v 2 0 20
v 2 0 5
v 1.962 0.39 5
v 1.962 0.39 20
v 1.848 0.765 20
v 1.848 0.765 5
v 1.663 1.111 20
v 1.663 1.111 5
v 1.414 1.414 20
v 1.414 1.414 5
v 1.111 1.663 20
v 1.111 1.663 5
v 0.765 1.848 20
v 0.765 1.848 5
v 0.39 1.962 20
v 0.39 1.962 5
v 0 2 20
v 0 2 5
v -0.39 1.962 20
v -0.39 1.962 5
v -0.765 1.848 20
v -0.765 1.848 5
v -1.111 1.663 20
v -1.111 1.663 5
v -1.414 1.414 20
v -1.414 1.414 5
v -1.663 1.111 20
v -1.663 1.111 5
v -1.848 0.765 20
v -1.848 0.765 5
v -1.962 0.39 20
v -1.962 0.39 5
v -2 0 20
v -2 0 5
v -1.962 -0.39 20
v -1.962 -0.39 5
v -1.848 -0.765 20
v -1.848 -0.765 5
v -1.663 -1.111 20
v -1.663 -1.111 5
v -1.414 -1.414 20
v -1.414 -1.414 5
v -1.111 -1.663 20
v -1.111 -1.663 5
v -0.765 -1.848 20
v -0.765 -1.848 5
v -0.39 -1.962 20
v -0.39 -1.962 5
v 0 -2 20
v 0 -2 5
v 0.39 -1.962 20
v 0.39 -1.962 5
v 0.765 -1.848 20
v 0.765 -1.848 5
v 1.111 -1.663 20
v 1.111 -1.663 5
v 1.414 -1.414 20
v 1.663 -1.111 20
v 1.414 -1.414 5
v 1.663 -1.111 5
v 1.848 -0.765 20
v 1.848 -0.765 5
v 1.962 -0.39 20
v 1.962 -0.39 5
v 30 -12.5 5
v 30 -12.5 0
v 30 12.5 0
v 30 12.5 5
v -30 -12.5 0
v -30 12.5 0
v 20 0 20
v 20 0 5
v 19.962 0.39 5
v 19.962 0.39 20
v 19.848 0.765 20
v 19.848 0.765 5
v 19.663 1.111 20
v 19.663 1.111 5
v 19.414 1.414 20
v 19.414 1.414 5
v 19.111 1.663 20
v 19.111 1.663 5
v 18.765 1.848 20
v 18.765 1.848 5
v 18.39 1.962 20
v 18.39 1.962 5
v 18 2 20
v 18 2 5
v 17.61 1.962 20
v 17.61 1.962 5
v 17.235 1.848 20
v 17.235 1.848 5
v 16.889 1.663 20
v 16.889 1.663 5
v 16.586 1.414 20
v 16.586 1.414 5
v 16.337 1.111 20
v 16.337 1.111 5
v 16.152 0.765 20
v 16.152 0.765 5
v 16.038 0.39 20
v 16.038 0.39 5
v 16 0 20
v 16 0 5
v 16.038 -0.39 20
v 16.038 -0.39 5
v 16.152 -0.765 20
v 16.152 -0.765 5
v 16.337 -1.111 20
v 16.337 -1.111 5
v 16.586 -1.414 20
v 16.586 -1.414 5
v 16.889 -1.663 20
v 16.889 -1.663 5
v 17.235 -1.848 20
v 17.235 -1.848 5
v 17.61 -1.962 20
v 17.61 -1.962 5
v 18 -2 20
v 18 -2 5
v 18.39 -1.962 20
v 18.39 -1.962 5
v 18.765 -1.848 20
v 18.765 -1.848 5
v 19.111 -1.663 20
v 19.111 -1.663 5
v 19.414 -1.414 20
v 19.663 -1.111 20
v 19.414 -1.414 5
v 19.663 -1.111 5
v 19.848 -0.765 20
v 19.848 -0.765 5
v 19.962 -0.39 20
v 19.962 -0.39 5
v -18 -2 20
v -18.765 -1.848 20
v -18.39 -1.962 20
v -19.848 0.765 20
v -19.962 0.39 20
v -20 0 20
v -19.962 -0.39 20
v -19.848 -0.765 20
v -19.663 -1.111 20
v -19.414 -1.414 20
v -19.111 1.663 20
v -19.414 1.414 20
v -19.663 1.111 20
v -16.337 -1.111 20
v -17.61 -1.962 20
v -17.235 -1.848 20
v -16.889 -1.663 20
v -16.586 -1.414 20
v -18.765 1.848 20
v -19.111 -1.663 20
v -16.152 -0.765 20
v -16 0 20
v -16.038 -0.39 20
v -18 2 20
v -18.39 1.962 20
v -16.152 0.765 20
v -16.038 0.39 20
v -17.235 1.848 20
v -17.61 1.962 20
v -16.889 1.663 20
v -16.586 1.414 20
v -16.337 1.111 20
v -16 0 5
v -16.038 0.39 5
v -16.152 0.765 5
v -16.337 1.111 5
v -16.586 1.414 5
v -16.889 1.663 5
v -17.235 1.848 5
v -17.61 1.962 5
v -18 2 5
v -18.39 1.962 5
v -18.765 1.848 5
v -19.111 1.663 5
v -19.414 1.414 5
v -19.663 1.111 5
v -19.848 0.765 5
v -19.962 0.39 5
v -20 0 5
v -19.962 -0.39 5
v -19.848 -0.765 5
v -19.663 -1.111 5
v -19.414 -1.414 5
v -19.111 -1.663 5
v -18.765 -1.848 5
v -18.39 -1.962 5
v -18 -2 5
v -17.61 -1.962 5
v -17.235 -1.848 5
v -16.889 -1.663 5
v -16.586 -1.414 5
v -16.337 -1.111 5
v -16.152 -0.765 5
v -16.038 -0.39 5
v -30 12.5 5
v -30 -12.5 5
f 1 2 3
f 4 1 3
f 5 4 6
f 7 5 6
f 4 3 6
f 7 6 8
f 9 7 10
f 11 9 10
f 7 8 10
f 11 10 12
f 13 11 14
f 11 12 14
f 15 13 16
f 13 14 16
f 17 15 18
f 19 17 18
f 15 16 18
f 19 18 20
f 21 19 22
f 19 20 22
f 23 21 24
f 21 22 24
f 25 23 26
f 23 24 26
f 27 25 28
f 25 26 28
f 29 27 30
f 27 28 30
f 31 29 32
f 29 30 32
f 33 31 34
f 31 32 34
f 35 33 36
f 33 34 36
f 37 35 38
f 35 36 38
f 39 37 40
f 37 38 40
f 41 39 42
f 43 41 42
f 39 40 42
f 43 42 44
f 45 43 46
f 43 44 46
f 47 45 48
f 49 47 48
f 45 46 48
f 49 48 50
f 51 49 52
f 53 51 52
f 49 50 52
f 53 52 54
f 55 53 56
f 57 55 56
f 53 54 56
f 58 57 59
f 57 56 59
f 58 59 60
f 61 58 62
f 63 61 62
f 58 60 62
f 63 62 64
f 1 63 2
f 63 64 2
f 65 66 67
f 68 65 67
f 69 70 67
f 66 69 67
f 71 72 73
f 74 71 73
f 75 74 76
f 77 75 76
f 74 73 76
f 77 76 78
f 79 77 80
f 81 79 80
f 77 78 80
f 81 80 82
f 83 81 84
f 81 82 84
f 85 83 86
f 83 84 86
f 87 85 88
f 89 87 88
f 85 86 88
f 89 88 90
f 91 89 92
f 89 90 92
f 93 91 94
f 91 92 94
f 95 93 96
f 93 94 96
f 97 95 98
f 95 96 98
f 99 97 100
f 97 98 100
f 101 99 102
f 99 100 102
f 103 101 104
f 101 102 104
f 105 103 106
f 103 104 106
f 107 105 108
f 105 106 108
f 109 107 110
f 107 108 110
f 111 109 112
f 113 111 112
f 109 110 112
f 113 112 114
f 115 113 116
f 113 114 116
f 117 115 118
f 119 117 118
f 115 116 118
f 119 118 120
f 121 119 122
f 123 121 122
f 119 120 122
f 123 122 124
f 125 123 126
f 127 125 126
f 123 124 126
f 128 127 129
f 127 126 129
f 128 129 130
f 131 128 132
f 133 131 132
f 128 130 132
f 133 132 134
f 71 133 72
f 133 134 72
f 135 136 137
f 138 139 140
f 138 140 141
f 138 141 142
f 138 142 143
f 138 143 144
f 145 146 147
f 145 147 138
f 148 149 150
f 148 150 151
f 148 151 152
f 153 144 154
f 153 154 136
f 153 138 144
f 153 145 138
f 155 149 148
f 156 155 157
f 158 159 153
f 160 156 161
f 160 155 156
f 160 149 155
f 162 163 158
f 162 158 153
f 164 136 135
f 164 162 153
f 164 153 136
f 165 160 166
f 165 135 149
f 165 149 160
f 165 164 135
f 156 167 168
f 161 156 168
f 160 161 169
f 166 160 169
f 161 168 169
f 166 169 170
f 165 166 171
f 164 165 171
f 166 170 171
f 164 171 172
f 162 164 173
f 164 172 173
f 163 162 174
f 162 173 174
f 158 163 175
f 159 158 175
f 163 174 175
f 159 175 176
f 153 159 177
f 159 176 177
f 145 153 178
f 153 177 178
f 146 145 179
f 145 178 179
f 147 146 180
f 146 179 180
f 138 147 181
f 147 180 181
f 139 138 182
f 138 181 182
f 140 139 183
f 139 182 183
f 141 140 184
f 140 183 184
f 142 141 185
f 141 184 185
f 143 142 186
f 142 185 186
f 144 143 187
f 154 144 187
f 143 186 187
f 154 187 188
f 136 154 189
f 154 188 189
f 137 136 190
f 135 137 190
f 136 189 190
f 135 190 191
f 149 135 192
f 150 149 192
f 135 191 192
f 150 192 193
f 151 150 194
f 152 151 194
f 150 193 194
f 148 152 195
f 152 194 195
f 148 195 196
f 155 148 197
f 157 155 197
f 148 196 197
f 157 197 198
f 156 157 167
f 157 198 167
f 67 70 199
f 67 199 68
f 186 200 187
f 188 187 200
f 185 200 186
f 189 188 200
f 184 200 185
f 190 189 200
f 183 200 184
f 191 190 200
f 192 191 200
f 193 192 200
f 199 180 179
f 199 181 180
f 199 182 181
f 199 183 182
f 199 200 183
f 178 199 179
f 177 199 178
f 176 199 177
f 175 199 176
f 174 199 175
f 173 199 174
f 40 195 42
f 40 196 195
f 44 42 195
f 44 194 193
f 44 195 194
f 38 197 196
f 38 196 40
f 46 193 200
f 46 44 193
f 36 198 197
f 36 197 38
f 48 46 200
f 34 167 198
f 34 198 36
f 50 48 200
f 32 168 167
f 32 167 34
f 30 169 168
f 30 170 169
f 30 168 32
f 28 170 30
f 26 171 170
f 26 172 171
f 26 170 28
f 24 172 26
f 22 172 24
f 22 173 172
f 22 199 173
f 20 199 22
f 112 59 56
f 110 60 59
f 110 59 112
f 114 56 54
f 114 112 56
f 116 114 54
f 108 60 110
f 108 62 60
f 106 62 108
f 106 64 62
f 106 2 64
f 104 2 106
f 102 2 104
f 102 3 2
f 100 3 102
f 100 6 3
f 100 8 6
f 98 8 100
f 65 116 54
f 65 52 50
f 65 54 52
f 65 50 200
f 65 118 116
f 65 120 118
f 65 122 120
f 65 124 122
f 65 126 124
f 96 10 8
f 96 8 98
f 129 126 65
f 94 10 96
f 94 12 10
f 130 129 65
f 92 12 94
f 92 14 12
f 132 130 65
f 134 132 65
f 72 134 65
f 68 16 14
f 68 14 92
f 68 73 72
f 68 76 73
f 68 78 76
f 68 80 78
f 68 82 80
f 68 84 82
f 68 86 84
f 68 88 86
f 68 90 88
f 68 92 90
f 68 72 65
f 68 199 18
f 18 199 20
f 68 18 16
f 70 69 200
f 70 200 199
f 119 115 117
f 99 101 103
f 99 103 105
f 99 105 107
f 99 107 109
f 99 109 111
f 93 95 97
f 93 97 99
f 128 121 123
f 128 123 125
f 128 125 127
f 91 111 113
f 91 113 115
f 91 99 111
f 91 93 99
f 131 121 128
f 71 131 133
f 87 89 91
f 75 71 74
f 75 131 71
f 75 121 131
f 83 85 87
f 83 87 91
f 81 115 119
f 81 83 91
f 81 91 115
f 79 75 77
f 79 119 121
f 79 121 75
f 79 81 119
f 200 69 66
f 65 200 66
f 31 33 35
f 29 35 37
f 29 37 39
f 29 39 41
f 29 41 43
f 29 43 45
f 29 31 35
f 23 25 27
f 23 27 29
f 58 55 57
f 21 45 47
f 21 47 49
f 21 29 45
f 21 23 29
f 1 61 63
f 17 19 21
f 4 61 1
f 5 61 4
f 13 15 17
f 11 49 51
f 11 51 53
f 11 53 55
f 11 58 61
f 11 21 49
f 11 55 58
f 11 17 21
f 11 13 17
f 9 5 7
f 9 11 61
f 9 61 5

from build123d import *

# Parameters (mm, degrees)
F0_W     = 60
F0_H     = 25
F1_DEPTH = 5
F2_R     = 2
F3_DEPTH = 15
F4_R     = 2
F5_DEPTH = 15
F6_DEPTH = 15
F7_R     = 2
F8_DEPTH = 15


with BuildPart() as f1:
    # F0 (on Top) → F1 (new body)
    with BuildSketch(Plane.XY):
        Rectangle(F0_W, F0_H)
    extrude(amount=F1_DEPTH)

    # F2 (on face) → F3 (join)
    with BuildSketch(Plane.XY.offset(5)):
        Circle(F2_R)
    extrude(amount=F3_DEPTH)

    # F4 (on face) → F5 (join)
    with BuildSketch(Plane.XY.offset(5)):
        with Locations((18, 0)):
            Circle(F4_R)
    extrude(amount=F5_DEPTH)

    # F4 (on face) → F6 (join)
    with BuildSketch(Plane.XY.offset(5)):
        with Locations((18, 0)):
            Circle(F4_R)
    extrude(amount=F6_DEPTH)

    # F7 (on face) → F8 (join)
    with BuildSketch(Plane.XY.offset(5)):
        with Locations((-18, 0)):
            Circle(F7_R)
    extrude(amount=F8_DEPTH)


solid = f1.part
